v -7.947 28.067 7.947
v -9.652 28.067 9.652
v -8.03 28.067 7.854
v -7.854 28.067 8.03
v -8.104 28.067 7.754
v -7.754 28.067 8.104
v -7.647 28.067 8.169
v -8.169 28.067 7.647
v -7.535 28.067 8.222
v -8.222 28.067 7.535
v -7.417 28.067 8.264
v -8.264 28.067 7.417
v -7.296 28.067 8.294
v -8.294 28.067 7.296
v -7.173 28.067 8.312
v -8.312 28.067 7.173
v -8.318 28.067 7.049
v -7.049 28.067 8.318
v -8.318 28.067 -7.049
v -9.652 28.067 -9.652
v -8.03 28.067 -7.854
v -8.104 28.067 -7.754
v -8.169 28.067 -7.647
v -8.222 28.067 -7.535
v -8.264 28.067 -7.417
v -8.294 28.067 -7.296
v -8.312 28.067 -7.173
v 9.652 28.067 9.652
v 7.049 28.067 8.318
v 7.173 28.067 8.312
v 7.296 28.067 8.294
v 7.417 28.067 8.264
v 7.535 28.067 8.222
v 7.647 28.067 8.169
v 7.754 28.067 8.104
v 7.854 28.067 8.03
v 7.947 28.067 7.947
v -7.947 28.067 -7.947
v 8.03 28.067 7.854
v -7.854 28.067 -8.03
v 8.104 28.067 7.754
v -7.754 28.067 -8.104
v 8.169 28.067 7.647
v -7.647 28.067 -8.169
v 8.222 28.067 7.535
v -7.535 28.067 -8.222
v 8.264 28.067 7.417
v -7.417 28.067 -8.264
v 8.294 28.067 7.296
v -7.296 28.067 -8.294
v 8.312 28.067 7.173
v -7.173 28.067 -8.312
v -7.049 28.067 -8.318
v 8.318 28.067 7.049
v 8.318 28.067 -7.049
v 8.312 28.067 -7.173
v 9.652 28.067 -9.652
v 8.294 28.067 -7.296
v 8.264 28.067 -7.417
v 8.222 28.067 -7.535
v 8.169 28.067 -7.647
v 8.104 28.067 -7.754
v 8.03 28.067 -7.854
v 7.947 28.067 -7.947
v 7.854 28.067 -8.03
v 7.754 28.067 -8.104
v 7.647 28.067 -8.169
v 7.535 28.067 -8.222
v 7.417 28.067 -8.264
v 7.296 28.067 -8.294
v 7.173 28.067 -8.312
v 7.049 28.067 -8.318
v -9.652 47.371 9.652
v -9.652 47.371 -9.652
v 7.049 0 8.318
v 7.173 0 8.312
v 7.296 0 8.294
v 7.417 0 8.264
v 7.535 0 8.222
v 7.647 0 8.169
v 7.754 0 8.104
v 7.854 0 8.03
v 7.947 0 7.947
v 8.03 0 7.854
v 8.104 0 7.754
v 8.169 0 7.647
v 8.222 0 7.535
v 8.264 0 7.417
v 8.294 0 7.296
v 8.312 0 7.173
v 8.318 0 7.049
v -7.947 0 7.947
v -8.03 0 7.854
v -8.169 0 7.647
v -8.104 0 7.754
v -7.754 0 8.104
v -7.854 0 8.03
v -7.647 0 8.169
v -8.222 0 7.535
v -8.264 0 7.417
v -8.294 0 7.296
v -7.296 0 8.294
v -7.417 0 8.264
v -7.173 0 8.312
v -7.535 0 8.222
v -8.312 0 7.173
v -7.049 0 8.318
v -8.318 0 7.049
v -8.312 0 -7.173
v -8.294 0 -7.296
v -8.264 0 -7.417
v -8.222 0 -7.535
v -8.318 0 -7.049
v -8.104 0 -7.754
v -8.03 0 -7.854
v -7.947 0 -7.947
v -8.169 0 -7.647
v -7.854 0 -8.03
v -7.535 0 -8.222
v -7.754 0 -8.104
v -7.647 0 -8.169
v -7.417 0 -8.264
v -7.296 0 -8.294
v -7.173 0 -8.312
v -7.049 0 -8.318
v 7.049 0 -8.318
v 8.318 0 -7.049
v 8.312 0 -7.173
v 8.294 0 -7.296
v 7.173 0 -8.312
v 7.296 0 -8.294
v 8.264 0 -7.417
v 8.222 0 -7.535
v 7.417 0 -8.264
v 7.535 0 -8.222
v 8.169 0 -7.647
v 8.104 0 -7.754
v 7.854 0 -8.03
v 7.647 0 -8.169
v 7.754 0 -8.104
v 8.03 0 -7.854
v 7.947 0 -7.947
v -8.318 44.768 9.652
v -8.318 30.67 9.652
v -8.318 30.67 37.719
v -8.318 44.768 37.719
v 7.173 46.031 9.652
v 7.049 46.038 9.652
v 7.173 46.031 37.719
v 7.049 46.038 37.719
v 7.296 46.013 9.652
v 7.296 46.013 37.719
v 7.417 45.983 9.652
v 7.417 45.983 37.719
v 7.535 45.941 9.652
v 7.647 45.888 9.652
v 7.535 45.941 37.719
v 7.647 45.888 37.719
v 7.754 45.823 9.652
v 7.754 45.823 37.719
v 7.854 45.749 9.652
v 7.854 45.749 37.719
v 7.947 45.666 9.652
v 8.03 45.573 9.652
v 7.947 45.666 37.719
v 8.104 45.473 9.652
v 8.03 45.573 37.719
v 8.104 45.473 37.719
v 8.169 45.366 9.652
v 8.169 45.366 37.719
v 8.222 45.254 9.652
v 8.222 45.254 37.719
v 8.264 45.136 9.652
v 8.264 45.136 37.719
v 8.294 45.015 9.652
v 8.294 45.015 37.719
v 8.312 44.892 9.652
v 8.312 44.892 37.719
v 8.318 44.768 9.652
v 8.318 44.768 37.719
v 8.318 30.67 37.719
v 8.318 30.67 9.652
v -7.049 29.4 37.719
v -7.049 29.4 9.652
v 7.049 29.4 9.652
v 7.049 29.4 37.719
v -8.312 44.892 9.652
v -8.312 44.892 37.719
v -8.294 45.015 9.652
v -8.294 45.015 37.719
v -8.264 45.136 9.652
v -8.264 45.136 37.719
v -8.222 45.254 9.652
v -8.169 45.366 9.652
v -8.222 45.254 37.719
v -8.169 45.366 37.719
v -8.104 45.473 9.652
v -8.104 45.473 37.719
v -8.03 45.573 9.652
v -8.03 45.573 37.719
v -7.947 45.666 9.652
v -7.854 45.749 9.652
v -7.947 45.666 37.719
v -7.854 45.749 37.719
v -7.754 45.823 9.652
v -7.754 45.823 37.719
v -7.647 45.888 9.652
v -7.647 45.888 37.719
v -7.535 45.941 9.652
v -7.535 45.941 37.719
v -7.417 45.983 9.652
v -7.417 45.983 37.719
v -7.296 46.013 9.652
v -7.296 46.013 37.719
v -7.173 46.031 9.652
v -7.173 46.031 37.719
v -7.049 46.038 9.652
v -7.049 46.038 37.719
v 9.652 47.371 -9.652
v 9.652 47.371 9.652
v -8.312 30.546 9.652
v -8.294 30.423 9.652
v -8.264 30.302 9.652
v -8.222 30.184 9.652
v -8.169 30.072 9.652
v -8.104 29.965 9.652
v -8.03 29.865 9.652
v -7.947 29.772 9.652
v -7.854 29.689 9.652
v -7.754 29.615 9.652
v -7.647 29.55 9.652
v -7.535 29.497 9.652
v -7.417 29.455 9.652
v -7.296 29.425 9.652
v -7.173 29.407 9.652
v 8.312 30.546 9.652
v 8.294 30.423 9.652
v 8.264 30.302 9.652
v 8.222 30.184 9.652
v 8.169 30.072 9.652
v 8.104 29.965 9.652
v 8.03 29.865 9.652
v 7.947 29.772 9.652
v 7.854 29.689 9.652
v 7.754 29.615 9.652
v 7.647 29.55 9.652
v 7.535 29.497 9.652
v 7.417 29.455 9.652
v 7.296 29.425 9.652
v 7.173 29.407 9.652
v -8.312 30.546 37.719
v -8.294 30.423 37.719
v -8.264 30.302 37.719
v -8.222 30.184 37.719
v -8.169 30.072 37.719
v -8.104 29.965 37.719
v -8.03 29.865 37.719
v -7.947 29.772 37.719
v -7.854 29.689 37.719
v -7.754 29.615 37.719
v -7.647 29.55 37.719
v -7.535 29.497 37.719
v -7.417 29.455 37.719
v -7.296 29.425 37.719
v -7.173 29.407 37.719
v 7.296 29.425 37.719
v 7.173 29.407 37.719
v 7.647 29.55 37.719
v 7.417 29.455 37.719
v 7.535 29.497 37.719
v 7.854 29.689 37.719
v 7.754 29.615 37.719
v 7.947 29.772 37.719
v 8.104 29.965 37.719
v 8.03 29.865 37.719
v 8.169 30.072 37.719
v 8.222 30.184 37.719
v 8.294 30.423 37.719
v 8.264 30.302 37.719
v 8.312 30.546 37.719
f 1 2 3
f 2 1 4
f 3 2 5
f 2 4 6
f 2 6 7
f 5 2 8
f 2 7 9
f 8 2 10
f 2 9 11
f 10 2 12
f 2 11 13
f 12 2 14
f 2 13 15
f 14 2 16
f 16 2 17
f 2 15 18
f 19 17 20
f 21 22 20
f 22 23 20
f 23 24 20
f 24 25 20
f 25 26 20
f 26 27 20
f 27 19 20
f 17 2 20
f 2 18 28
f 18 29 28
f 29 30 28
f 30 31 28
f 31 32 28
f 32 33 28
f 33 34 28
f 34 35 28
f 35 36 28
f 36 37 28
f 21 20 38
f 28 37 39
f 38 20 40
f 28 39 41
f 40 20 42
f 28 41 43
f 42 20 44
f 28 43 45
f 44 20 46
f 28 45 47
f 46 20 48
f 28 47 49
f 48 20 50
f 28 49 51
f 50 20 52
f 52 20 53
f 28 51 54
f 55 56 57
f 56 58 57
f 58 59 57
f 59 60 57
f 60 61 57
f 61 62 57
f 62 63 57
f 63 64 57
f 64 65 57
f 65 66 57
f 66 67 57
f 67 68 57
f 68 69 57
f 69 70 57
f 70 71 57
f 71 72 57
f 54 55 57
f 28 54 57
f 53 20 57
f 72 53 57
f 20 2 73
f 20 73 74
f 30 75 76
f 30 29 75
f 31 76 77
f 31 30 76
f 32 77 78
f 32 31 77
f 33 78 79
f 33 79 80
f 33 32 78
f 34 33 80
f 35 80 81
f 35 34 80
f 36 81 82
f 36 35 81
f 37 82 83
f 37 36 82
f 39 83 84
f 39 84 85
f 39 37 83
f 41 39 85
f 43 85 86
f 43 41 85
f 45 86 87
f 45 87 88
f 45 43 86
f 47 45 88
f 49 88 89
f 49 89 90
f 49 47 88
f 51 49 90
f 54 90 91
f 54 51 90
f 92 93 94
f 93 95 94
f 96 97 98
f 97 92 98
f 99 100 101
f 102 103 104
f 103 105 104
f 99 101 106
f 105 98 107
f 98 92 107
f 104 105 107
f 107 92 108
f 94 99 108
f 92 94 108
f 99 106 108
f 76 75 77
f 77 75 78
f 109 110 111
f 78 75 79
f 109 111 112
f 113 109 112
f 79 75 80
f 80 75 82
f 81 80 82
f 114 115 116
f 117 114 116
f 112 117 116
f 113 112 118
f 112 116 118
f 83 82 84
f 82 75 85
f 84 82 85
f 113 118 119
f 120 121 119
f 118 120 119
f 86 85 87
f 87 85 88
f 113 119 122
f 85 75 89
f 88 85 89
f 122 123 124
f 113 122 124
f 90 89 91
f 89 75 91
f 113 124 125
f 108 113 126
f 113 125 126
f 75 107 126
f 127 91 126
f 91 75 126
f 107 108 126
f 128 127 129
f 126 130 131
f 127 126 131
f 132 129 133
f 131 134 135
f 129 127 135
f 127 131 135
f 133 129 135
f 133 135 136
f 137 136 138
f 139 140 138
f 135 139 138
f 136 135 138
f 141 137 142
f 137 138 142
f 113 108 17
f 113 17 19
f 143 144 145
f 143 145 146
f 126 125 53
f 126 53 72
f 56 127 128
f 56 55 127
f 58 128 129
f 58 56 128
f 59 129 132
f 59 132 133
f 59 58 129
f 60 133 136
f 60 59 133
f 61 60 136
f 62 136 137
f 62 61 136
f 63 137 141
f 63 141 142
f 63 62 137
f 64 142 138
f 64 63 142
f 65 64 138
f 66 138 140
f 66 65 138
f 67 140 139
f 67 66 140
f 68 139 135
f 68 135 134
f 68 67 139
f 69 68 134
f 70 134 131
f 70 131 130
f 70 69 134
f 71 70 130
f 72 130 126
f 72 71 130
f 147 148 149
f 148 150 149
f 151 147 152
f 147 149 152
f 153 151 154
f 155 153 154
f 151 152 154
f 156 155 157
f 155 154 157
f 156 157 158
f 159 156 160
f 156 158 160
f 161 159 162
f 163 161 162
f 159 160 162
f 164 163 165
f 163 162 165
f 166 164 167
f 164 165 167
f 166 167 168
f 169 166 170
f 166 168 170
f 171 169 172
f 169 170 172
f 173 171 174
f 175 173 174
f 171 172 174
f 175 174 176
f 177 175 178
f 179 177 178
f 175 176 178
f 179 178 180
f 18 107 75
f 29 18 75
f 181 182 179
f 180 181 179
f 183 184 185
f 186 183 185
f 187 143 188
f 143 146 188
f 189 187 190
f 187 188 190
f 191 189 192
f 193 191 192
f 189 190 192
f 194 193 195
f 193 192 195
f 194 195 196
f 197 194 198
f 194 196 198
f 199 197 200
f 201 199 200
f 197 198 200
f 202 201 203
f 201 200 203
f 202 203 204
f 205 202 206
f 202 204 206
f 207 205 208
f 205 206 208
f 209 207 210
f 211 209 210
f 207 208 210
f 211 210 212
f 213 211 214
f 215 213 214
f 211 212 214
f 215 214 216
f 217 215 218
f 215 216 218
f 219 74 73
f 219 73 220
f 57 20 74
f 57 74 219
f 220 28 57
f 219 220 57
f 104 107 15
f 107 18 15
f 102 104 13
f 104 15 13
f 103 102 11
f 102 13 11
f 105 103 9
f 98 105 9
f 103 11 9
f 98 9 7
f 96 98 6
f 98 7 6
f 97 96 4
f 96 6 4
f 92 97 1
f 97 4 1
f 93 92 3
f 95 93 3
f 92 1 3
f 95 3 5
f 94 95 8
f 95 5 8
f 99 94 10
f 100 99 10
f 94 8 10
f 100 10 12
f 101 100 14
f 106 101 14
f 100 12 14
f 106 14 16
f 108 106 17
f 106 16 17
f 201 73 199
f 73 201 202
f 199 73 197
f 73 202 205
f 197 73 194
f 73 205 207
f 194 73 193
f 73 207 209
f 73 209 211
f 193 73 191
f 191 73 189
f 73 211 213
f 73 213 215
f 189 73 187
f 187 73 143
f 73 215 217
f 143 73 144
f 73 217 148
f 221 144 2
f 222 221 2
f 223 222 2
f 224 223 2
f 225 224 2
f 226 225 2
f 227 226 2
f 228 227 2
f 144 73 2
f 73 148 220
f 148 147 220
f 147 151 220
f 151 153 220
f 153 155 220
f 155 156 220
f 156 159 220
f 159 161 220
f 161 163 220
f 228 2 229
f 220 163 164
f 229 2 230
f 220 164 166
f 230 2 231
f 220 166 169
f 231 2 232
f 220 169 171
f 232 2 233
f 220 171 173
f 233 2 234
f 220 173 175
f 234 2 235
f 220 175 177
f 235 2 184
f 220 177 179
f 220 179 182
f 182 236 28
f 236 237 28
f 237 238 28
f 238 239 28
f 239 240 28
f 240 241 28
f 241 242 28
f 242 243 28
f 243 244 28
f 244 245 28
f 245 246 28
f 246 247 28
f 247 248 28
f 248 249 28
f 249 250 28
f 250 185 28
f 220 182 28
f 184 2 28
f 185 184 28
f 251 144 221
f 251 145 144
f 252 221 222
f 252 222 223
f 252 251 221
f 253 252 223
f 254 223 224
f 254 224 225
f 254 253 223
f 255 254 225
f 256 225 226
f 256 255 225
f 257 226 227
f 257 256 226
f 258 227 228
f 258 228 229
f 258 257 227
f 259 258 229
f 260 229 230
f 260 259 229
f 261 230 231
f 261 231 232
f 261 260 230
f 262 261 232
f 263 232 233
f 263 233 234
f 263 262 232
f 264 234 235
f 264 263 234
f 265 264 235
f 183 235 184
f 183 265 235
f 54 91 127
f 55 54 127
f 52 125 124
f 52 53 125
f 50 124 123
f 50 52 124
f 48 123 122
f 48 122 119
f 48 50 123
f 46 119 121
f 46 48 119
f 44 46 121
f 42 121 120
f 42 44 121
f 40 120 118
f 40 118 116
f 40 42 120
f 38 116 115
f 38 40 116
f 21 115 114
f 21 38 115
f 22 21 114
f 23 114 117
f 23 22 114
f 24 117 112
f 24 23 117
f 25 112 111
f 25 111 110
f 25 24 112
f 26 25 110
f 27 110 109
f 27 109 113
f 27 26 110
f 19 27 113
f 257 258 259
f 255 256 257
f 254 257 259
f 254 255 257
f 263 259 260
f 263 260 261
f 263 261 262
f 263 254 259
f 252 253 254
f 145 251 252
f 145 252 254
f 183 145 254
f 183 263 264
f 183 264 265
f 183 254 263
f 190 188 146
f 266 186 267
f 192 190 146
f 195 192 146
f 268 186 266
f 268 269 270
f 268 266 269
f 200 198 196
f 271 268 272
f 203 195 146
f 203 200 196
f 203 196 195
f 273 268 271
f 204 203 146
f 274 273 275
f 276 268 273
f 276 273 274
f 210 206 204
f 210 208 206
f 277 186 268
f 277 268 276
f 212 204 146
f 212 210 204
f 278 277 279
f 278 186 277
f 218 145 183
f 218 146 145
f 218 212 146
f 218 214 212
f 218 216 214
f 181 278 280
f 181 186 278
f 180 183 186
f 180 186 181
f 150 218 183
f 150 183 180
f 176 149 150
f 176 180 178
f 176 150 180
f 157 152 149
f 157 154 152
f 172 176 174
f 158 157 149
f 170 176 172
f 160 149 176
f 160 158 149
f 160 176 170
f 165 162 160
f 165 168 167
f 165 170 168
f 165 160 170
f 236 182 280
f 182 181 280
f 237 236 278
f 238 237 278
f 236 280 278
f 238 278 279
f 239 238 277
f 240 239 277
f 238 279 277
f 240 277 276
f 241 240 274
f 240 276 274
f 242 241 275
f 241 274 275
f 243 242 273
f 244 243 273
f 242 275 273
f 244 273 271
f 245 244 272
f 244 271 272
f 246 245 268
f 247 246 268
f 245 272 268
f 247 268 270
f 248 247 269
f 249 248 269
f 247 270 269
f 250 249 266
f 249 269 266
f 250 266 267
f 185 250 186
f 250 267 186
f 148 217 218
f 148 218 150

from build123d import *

# Parameters (mm, degrees)
SKETCH1_W           = 16.637
SKETCH1_H           = 16.637
BOSS_EXTRUDE1_DEPTH = 28.067
SKETCH2_W           = 19.304
SKETCH2_H           = 19.304
BOSS_EXTRUDE2_DEPTH = 19.304
SKETCH3_W           = 16.637
SKETCH3_H           = 16.637
BOSS_EXTRUDE3_DEPTH = 28.067
FILLET1_R           = 1.27


with BuildPart() as part:
    # Sketch1 → Boss-Extrude1 (new body)
    with BuildSketch(Plane(origin=(0, 0, 0), x_dir=(1, 0, 0), z_dir=(0, 1, 0))):
        Rectangle(SKETCH1_W, SKETCH1_H)
    extrude(amount=BOSS_EXTRUDE1_DEPTH)

    # Sketch2 → Boss-Extrude2 (add)
    with BuildSketch(Plane(origin=(0, 28.067, 0), x_dir=(1, 0, 0), z_dir=(0, 1, 0))):
        Rectangle(SKETCH2_W, SKETCH2_H)
    extrude(amount=BOSS_EXTRUDE2_DEPTH)

    # Sketch3 → Boss-Extrude3 (add)
    with BuildSketch(Plane.XY.offset(9.652)):
        with Locations((0, 37.719)):
            Rectangle(SKETCH3_W, SKETCH3_H)
    extrude(amount=BOSS_EXTRUDE3_DEPTH)

    # Fillet1
    fillet1_edges = [part.edges().sort_by_distance(p)[0] for p in [
        (8.3185, 29.4005, 23.6855),
        (8.3185, 46.0375, 23.6855),
        (-8.3185, 46.0375, 23.6855),
        (-8.3185, 29.4005, 23.6855),
        (8.3185, 14.0335, 8.3185),
        (-8.3185, 14.0335, 8.3185),
        (-8.3185, 14.0335, -8.3185),
        (8.3185, 14.0335, -8.3185),
    ]]
    fillet(fillet1_edges, radius=FILLET1_R)


solid = part.part
